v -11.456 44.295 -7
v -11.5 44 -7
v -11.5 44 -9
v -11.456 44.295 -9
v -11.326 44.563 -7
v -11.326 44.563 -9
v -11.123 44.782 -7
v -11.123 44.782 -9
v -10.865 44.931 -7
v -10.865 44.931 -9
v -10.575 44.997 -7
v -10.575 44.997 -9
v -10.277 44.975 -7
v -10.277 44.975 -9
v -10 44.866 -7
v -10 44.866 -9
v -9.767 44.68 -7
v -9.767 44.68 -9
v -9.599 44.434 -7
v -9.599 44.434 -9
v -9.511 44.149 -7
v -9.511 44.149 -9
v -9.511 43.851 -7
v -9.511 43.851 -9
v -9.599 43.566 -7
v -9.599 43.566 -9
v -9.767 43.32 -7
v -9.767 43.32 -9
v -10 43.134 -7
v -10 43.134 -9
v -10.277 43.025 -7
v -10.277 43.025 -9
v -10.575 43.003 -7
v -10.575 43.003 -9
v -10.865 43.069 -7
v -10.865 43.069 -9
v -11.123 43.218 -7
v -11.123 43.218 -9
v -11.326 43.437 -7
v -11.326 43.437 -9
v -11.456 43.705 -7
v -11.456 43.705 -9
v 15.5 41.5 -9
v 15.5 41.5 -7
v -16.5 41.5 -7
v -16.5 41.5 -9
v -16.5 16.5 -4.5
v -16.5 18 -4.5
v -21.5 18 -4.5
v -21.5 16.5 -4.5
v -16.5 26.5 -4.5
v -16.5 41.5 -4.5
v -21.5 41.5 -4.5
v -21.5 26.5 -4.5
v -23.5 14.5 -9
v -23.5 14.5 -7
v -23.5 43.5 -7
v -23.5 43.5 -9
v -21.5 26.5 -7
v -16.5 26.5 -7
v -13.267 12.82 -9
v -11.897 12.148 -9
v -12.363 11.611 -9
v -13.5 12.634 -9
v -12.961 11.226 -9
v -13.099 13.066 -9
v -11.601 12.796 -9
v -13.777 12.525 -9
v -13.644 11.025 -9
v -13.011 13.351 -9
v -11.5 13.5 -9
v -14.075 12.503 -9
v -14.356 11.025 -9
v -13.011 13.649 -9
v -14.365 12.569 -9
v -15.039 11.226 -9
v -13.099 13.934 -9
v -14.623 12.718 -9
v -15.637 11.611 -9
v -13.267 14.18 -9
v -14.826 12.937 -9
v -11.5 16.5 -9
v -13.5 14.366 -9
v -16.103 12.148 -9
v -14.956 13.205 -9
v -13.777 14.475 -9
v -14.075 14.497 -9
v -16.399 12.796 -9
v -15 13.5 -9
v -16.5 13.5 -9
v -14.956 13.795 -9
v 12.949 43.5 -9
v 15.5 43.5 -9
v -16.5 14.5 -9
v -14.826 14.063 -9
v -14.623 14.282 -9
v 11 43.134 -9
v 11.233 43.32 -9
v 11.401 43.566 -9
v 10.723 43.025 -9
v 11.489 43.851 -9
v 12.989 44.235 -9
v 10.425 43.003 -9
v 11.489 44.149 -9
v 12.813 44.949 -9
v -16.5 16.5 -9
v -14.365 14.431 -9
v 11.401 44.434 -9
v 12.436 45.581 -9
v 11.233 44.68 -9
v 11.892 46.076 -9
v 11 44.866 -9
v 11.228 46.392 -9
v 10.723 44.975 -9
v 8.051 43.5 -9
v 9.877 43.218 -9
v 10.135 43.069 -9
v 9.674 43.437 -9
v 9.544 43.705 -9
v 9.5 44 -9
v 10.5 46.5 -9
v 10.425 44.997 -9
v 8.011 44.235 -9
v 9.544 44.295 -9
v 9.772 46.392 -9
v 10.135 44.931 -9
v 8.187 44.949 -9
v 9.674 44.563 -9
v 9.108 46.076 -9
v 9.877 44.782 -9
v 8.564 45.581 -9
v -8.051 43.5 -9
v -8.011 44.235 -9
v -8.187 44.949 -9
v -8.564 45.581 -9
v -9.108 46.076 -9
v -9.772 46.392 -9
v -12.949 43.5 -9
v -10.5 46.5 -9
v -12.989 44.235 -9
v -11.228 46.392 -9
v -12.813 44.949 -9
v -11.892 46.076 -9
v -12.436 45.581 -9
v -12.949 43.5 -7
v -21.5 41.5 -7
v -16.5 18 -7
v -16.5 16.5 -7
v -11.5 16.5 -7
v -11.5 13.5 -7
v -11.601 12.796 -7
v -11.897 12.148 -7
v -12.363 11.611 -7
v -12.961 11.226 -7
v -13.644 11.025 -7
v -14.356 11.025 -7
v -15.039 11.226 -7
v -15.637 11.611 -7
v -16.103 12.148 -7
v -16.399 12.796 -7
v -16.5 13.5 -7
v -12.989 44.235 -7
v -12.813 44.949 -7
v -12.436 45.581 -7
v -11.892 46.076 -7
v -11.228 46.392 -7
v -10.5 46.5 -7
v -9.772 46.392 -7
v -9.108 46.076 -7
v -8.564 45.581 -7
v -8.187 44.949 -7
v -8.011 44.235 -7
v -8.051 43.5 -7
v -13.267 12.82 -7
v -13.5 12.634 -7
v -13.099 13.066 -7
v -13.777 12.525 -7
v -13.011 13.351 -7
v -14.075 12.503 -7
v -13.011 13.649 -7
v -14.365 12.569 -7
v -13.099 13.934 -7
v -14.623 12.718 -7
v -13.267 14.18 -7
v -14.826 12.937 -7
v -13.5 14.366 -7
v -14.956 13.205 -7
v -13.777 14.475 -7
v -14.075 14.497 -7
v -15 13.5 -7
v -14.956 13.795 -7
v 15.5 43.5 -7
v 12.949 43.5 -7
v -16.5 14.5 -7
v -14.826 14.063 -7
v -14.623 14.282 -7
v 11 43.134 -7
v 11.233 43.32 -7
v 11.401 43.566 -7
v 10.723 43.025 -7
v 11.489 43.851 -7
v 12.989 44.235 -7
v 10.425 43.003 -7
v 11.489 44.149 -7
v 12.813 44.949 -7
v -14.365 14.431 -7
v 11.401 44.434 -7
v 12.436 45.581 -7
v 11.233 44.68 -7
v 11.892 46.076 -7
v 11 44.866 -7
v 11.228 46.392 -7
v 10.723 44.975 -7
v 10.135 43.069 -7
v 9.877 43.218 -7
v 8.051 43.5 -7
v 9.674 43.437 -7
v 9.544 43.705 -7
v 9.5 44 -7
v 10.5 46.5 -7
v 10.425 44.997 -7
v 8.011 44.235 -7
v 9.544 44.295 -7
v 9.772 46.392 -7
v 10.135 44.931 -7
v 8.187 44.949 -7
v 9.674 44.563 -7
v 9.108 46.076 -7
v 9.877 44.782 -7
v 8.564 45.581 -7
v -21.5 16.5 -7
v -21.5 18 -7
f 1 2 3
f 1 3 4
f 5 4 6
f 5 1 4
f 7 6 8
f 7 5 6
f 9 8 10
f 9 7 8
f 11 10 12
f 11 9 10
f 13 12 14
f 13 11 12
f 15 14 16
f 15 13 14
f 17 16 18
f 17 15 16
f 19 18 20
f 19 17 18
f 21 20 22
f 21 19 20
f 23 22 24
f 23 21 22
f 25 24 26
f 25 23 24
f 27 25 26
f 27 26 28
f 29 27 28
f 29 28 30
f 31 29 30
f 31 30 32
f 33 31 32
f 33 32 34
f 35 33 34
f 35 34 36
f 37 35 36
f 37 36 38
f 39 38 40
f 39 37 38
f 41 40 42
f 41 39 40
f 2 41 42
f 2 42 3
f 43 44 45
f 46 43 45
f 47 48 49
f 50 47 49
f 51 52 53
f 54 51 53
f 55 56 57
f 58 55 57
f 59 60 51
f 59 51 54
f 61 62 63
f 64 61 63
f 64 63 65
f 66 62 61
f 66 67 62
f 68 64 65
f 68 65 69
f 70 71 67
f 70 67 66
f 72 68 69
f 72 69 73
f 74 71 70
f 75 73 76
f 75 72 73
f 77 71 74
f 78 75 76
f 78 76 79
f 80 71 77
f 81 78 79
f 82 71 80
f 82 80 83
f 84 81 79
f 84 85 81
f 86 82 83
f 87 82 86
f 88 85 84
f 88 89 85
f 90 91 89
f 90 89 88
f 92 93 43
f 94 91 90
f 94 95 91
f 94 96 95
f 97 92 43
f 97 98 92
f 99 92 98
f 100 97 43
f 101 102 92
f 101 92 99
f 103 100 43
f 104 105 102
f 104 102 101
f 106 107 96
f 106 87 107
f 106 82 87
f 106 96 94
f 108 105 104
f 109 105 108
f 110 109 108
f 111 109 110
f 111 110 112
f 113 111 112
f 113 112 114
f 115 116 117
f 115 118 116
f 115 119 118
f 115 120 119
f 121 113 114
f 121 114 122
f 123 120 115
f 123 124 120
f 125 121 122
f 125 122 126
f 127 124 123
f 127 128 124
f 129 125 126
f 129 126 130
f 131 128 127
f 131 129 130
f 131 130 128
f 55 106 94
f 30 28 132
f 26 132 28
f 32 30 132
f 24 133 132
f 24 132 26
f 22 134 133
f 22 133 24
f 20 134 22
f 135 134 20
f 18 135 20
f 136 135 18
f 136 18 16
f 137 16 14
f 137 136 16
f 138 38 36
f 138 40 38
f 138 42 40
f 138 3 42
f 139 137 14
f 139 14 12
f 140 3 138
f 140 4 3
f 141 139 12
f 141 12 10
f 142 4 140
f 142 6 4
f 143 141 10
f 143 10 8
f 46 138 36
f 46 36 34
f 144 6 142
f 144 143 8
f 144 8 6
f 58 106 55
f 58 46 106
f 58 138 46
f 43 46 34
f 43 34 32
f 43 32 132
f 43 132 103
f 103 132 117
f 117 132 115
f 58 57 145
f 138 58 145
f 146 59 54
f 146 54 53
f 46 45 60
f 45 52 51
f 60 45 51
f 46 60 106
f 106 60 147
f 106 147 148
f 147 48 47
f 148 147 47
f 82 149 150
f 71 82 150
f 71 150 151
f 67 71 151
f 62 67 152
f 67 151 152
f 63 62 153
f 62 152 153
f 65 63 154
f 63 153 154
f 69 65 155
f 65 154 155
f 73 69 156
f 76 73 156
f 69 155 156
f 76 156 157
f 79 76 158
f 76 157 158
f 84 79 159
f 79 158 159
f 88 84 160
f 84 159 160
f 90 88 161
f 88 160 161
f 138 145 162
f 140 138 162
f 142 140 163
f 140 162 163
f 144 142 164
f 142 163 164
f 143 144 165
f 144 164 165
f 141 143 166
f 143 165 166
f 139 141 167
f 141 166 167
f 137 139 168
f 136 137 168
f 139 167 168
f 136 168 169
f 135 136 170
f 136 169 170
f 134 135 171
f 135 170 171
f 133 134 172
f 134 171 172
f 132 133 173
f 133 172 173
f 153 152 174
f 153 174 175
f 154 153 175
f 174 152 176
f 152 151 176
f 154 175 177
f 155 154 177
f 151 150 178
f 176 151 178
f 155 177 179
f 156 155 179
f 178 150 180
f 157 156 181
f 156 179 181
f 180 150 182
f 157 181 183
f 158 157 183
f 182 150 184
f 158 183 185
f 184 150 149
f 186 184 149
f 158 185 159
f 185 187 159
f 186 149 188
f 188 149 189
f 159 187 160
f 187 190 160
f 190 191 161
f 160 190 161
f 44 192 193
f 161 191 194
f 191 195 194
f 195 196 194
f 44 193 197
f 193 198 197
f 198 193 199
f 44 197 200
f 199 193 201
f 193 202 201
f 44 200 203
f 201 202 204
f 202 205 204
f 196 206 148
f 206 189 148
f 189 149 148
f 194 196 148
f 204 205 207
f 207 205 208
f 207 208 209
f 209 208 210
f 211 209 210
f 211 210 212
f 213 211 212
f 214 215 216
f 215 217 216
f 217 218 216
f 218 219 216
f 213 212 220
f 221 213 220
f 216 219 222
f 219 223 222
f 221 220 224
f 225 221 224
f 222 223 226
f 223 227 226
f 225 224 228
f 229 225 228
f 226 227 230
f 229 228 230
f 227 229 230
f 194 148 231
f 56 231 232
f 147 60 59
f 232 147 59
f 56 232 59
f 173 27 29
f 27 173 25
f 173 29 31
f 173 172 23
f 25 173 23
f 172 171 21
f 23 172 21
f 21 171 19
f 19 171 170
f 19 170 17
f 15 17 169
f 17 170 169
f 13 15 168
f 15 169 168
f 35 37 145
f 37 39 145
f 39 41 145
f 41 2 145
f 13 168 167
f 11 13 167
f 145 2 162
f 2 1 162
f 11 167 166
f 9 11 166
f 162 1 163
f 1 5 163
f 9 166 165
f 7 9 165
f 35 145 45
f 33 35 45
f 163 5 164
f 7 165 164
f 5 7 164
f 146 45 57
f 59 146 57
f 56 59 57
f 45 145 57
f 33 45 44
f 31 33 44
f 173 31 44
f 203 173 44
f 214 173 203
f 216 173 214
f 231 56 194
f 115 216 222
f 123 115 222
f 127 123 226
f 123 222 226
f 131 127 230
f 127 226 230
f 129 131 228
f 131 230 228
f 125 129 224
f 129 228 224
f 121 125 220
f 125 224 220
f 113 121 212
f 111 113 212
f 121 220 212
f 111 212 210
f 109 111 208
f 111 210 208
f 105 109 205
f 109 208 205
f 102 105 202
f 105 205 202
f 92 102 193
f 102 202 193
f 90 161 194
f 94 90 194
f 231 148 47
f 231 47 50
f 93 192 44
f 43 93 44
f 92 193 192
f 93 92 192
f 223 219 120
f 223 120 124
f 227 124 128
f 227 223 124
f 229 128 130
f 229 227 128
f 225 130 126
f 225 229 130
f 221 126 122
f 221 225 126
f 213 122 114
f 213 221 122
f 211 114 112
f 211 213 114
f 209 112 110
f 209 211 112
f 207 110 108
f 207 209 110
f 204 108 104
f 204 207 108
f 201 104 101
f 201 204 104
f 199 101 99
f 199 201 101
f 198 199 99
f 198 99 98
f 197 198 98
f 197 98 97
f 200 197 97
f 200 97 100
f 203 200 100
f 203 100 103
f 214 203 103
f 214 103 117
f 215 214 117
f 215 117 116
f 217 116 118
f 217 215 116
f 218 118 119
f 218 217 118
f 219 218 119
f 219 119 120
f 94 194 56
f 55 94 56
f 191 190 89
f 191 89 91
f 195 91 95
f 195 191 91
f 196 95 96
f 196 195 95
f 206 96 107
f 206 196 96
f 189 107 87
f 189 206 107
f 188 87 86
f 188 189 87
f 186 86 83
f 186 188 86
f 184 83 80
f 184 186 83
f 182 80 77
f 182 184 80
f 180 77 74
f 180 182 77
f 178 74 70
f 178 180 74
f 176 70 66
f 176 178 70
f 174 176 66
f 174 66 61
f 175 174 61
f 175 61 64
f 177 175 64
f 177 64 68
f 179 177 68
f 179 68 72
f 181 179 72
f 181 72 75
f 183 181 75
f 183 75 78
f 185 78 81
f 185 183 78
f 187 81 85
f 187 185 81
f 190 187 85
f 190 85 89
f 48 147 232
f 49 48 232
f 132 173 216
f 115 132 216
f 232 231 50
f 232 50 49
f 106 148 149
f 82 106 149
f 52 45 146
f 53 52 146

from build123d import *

# Parameters (mm, degrees)
SKETCH1_W          = 5
SKETCH1_H          = 15
CLAMP_PART_DEPTH   = 2.5
SKETCH1_H_2        = 1.5
CLAMP_PART_2_DEPTH = 2.5
SKETCH2_R          = 1
OUTSIDE_DEPTH      = 2


with BuildPart() as part:
    # Sketch1 → Clamp part (new body)
    with BuildSketch(Plane(origin=(0, 0, -7), x_dir=(-1, 0, 0), z_dir=(0, 0, -1))):
        with Locations((19, 34)):
            Rectangle(SKETCH1_W, SKETCH1_H)
    extrude(amount=-CLAMP_PART_DEPTH)



with BuildPart() as body_2:
    # Sketch1 → Clamp part 2 (new body)
    with BuildSketch(Plane(origin=(0, 0, -7), x_dir=(-1, 0, 0), z_dir=(0, 0, -1))):
        with Locations((19, 17.25)):
            Rectangle(SKETCH1_W, SKETCH1_H_2)
    extrude(amount=-CLAMP_PART_2_DEPTH)


with BuildPart() as part_1:
    add(part.part)

    add(body_2.part)  # Outside merges body 2
    # Sketch2 → Outside (add)
    with BuildSketch(Plane(origin=(0, 0, -7), x_dir=(-1, 0, 0), z_dir=(0, 0, -1))):
        with BuildLine():
            Line((23.5, 43.5), (16.5, 43.5))
            Line((16.5, 43.5), (12.949489743, 43.5))
            ThreePointArc((12.949489743, 43.5), (10.5, 46.5), (8.050510257, 43.5))
            Line((8.050510257, 43.5), (-8.050510257, 43.5))
            ThreePointArc((-8.050510257, 43.5), (-10.5, 46.5), (-12.949489743, 43.5))
            Line((-12.949489743, 43.5), (-15.5, 43.5))
            Line((-15.5, 43.5), (-15.5, 41.5))
            Line((-15.5, 41.5), (16.5, 41.5))
            Line((16.5, 41.5), (16.5, 16.5))
            Line((16.5, 16.5), (11.5, 16.5))
            Line((11.5, 16.5), (11.5, 13.5))
            ThreePointArc((11.5, 13.5), (14, 11), (16.5, 13.5))
            Line((16.5, 13.5), (16.5, 14.5))
            Line((16.5, 14.5), (23.5, 14.5))
            Line((23.5, 14.5), (23.5, 43.5))
        make_face()
        with Locations((-10.5, 44)):
            Circle(SKETCH2_R, mode=Mode.SUBTRACT)
        with Locations((10.5, 44)):
            Circle(SKETCH2_R, mode=Mode.SUBTRACT)
        with Locations((14, 13.5)):
            Circle(SKETCH2_R, mode=Mode.SUBTRACT)
    extrude(amount=OUTSIDE_DEPTH)


solid = part_1.part
